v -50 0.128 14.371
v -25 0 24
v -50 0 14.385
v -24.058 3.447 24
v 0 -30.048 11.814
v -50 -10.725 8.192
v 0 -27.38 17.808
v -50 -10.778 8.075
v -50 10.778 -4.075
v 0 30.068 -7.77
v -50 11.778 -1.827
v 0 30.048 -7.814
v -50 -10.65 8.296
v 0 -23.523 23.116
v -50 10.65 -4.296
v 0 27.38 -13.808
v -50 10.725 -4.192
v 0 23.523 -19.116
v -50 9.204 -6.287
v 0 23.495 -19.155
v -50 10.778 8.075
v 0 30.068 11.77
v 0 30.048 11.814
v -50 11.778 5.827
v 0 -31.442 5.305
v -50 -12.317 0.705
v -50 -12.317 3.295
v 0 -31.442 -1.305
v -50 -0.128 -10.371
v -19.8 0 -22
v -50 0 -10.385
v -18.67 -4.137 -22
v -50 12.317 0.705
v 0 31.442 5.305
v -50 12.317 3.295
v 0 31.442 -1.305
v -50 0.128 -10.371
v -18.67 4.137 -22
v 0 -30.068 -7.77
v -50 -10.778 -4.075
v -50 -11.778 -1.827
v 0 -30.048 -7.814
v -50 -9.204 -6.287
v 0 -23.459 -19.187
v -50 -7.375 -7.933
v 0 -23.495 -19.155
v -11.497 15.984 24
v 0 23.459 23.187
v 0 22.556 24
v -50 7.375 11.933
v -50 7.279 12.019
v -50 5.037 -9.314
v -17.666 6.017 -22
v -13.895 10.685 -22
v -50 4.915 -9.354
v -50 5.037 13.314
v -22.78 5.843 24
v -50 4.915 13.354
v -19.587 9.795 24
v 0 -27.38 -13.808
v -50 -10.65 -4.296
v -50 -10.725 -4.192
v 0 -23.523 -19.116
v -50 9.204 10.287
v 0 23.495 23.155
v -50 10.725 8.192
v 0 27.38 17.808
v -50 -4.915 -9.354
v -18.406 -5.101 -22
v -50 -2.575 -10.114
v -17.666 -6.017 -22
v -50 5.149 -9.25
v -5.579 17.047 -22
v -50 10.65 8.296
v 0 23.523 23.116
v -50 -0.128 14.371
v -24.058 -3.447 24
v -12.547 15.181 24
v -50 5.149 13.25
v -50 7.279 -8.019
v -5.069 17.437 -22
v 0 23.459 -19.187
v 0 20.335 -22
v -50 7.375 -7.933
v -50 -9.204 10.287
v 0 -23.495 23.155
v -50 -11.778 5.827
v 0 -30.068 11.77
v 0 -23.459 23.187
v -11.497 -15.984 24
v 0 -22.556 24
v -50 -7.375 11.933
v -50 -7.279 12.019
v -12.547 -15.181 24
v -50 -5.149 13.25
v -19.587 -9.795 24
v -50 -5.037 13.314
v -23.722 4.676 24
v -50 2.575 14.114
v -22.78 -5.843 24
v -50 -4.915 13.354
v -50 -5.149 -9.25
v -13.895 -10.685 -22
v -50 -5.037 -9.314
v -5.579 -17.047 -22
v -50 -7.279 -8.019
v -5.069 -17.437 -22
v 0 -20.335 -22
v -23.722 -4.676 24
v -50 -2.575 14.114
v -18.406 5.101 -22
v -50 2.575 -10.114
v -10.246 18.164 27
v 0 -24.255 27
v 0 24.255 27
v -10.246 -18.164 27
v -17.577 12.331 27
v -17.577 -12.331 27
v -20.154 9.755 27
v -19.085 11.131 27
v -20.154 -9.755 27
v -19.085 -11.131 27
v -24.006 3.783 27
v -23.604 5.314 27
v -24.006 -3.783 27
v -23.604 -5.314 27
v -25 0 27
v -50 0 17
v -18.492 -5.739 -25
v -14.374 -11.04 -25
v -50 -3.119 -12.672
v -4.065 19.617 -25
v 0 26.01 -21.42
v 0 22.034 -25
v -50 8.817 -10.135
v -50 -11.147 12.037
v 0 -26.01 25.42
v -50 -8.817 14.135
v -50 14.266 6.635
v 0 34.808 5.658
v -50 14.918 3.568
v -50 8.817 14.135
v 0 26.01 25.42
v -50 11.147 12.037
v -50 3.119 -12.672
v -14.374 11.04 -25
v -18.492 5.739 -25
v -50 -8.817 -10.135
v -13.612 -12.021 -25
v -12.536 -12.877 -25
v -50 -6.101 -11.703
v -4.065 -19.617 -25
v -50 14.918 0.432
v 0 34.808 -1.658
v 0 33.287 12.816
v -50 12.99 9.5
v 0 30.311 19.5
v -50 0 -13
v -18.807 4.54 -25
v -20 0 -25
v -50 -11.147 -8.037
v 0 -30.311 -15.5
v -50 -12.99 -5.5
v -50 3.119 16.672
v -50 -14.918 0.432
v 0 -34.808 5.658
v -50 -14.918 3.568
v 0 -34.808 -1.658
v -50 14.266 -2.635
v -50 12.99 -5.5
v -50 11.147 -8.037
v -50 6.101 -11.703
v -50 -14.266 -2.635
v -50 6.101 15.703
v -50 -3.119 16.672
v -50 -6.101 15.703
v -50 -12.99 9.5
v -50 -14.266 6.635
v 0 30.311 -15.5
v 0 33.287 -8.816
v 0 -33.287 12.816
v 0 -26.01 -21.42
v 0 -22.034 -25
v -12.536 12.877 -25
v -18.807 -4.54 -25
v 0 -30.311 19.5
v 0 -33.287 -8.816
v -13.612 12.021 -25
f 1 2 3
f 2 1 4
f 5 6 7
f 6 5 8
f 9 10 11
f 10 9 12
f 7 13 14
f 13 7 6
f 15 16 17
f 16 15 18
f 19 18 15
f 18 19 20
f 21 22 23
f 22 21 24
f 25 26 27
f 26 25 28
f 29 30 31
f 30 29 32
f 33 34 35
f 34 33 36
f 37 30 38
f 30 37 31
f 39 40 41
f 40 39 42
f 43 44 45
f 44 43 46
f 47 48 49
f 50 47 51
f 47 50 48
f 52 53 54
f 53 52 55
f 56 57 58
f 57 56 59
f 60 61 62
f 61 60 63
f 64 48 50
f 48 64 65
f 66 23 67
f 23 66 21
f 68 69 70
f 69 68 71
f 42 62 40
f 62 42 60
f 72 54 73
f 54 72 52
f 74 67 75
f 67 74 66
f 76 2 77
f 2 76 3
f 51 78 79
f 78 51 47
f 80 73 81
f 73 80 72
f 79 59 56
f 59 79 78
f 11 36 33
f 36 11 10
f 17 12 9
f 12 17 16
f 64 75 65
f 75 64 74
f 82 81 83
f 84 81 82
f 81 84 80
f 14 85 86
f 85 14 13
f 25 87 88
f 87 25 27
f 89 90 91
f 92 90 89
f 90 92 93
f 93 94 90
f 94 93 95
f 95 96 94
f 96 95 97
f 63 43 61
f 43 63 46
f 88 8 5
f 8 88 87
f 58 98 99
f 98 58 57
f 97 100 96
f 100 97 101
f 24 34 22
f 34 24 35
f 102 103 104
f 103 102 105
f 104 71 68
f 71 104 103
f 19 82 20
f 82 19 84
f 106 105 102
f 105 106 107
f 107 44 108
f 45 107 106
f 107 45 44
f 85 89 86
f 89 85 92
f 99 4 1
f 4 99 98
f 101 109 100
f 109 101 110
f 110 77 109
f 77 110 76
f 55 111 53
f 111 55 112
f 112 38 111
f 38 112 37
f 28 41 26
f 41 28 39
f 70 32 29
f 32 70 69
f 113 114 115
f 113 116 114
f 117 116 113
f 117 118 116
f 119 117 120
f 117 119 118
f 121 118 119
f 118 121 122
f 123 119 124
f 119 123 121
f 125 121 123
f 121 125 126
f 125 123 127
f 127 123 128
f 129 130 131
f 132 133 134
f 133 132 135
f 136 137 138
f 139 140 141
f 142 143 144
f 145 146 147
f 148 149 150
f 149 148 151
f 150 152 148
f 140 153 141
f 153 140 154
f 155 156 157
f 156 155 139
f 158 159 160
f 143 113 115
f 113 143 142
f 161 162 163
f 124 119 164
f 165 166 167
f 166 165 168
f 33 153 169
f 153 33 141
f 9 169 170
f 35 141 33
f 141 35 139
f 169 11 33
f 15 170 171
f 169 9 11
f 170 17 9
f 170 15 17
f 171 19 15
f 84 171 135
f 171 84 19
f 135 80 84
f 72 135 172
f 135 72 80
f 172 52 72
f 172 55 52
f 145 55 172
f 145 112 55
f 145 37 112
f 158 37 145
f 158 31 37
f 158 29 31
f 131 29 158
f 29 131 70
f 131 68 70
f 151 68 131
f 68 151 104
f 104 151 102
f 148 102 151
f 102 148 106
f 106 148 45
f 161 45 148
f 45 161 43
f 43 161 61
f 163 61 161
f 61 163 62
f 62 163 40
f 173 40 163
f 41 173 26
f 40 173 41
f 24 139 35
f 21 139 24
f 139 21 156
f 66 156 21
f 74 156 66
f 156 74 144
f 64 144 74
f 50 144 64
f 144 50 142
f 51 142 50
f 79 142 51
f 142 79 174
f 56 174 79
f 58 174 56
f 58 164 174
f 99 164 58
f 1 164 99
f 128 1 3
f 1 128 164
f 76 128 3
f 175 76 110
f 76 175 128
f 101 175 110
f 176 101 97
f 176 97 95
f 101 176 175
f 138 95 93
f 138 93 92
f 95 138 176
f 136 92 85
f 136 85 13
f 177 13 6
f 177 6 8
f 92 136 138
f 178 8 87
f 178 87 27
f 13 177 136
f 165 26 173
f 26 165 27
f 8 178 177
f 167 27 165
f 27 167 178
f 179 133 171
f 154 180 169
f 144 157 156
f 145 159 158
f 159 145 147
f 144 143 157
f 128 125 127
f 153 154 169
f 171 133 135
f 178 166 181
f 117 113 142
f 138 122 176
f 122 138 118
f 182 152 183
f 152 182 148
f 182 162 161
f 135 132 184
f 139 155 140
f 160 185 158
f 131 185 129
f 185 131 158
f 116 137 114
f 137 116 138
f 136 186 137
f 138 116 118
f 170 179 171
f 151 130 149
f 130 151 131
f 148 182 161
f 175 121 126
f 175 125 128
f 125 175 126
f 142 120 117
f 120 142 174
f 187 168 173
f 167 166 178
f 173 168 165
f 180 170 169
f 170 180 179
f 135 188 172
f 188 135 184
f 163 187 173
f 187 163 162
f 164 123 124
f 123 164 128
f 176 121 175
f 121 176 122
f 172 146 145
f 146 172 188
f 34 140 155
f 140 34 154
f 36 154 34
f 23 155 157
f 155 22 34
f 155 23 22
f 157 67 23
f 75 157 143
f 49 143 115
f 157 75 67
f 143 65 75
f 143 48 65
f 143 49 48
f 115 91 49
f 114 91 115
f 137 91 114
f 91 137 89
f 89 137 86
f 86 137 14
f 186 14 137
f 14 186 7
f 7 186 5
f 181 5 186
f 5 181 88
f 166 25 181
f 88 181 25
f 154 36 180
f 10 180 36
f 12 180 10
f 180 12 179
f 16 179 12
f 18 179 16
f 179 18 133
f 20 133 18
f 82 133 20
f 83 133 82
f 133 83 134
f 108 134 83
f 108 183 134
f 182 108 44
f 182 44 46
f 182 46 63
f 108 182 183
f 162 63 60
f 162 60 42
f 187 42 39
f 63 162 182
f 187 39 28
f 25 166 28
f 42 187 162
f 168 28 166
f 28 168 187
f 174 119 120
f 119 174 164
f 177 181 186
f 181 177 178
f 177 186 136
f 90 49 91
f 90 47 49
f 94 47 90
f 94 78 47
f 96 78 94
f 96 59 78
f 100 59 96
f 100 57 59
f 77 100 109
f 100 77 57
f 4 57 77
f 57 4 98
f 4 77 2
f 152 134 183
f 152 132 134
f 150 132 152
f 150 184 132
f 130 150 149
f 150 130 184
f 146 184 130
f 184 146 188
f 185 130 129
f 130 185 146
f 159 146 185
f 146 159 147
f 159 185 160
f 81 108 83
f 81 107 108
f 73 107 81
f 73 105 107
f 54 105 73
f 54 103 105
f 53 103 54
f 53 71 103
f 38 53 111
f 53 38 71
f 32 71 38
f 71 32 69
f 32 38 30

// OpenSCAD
module nose(){
translate([155,0,2])
rotate([0,180,0])
  difference(){
    union(){
      difference(){


          translate([155,0,0])
          rotate([0,90,0])
          cylinder(r1=35,r2=15,h=50);

        union(){

          // Inner
          translate([154,0,0])
          rotate([0,90,0])
          cylinder(r1=32,r2=12,h=52);

          // Down plane
          translate([1,-100,-65])
          cube([2000,2000,40]);

          // Upper plane
          translate([1,-100,25])
          cube([2000,2000,40]);
        }
      }
      // Down plane
      translate([155,-25,-25])
      cube([30,50,3]);

      // Upper plane
      translate([155,-25,24])
      cube([30,50,3]);

    }

    // Clear perimeter of nose
    difference(){
      translate([155,0,0])
      rotate([0,90,0])
      cylinder(r1=370,r2=170,h=50);

      translate([155,0,0])
      rotate([0,90,0])
      cylinder(r1=35,r2=15,h=50);

    }
  }
}

nose();
